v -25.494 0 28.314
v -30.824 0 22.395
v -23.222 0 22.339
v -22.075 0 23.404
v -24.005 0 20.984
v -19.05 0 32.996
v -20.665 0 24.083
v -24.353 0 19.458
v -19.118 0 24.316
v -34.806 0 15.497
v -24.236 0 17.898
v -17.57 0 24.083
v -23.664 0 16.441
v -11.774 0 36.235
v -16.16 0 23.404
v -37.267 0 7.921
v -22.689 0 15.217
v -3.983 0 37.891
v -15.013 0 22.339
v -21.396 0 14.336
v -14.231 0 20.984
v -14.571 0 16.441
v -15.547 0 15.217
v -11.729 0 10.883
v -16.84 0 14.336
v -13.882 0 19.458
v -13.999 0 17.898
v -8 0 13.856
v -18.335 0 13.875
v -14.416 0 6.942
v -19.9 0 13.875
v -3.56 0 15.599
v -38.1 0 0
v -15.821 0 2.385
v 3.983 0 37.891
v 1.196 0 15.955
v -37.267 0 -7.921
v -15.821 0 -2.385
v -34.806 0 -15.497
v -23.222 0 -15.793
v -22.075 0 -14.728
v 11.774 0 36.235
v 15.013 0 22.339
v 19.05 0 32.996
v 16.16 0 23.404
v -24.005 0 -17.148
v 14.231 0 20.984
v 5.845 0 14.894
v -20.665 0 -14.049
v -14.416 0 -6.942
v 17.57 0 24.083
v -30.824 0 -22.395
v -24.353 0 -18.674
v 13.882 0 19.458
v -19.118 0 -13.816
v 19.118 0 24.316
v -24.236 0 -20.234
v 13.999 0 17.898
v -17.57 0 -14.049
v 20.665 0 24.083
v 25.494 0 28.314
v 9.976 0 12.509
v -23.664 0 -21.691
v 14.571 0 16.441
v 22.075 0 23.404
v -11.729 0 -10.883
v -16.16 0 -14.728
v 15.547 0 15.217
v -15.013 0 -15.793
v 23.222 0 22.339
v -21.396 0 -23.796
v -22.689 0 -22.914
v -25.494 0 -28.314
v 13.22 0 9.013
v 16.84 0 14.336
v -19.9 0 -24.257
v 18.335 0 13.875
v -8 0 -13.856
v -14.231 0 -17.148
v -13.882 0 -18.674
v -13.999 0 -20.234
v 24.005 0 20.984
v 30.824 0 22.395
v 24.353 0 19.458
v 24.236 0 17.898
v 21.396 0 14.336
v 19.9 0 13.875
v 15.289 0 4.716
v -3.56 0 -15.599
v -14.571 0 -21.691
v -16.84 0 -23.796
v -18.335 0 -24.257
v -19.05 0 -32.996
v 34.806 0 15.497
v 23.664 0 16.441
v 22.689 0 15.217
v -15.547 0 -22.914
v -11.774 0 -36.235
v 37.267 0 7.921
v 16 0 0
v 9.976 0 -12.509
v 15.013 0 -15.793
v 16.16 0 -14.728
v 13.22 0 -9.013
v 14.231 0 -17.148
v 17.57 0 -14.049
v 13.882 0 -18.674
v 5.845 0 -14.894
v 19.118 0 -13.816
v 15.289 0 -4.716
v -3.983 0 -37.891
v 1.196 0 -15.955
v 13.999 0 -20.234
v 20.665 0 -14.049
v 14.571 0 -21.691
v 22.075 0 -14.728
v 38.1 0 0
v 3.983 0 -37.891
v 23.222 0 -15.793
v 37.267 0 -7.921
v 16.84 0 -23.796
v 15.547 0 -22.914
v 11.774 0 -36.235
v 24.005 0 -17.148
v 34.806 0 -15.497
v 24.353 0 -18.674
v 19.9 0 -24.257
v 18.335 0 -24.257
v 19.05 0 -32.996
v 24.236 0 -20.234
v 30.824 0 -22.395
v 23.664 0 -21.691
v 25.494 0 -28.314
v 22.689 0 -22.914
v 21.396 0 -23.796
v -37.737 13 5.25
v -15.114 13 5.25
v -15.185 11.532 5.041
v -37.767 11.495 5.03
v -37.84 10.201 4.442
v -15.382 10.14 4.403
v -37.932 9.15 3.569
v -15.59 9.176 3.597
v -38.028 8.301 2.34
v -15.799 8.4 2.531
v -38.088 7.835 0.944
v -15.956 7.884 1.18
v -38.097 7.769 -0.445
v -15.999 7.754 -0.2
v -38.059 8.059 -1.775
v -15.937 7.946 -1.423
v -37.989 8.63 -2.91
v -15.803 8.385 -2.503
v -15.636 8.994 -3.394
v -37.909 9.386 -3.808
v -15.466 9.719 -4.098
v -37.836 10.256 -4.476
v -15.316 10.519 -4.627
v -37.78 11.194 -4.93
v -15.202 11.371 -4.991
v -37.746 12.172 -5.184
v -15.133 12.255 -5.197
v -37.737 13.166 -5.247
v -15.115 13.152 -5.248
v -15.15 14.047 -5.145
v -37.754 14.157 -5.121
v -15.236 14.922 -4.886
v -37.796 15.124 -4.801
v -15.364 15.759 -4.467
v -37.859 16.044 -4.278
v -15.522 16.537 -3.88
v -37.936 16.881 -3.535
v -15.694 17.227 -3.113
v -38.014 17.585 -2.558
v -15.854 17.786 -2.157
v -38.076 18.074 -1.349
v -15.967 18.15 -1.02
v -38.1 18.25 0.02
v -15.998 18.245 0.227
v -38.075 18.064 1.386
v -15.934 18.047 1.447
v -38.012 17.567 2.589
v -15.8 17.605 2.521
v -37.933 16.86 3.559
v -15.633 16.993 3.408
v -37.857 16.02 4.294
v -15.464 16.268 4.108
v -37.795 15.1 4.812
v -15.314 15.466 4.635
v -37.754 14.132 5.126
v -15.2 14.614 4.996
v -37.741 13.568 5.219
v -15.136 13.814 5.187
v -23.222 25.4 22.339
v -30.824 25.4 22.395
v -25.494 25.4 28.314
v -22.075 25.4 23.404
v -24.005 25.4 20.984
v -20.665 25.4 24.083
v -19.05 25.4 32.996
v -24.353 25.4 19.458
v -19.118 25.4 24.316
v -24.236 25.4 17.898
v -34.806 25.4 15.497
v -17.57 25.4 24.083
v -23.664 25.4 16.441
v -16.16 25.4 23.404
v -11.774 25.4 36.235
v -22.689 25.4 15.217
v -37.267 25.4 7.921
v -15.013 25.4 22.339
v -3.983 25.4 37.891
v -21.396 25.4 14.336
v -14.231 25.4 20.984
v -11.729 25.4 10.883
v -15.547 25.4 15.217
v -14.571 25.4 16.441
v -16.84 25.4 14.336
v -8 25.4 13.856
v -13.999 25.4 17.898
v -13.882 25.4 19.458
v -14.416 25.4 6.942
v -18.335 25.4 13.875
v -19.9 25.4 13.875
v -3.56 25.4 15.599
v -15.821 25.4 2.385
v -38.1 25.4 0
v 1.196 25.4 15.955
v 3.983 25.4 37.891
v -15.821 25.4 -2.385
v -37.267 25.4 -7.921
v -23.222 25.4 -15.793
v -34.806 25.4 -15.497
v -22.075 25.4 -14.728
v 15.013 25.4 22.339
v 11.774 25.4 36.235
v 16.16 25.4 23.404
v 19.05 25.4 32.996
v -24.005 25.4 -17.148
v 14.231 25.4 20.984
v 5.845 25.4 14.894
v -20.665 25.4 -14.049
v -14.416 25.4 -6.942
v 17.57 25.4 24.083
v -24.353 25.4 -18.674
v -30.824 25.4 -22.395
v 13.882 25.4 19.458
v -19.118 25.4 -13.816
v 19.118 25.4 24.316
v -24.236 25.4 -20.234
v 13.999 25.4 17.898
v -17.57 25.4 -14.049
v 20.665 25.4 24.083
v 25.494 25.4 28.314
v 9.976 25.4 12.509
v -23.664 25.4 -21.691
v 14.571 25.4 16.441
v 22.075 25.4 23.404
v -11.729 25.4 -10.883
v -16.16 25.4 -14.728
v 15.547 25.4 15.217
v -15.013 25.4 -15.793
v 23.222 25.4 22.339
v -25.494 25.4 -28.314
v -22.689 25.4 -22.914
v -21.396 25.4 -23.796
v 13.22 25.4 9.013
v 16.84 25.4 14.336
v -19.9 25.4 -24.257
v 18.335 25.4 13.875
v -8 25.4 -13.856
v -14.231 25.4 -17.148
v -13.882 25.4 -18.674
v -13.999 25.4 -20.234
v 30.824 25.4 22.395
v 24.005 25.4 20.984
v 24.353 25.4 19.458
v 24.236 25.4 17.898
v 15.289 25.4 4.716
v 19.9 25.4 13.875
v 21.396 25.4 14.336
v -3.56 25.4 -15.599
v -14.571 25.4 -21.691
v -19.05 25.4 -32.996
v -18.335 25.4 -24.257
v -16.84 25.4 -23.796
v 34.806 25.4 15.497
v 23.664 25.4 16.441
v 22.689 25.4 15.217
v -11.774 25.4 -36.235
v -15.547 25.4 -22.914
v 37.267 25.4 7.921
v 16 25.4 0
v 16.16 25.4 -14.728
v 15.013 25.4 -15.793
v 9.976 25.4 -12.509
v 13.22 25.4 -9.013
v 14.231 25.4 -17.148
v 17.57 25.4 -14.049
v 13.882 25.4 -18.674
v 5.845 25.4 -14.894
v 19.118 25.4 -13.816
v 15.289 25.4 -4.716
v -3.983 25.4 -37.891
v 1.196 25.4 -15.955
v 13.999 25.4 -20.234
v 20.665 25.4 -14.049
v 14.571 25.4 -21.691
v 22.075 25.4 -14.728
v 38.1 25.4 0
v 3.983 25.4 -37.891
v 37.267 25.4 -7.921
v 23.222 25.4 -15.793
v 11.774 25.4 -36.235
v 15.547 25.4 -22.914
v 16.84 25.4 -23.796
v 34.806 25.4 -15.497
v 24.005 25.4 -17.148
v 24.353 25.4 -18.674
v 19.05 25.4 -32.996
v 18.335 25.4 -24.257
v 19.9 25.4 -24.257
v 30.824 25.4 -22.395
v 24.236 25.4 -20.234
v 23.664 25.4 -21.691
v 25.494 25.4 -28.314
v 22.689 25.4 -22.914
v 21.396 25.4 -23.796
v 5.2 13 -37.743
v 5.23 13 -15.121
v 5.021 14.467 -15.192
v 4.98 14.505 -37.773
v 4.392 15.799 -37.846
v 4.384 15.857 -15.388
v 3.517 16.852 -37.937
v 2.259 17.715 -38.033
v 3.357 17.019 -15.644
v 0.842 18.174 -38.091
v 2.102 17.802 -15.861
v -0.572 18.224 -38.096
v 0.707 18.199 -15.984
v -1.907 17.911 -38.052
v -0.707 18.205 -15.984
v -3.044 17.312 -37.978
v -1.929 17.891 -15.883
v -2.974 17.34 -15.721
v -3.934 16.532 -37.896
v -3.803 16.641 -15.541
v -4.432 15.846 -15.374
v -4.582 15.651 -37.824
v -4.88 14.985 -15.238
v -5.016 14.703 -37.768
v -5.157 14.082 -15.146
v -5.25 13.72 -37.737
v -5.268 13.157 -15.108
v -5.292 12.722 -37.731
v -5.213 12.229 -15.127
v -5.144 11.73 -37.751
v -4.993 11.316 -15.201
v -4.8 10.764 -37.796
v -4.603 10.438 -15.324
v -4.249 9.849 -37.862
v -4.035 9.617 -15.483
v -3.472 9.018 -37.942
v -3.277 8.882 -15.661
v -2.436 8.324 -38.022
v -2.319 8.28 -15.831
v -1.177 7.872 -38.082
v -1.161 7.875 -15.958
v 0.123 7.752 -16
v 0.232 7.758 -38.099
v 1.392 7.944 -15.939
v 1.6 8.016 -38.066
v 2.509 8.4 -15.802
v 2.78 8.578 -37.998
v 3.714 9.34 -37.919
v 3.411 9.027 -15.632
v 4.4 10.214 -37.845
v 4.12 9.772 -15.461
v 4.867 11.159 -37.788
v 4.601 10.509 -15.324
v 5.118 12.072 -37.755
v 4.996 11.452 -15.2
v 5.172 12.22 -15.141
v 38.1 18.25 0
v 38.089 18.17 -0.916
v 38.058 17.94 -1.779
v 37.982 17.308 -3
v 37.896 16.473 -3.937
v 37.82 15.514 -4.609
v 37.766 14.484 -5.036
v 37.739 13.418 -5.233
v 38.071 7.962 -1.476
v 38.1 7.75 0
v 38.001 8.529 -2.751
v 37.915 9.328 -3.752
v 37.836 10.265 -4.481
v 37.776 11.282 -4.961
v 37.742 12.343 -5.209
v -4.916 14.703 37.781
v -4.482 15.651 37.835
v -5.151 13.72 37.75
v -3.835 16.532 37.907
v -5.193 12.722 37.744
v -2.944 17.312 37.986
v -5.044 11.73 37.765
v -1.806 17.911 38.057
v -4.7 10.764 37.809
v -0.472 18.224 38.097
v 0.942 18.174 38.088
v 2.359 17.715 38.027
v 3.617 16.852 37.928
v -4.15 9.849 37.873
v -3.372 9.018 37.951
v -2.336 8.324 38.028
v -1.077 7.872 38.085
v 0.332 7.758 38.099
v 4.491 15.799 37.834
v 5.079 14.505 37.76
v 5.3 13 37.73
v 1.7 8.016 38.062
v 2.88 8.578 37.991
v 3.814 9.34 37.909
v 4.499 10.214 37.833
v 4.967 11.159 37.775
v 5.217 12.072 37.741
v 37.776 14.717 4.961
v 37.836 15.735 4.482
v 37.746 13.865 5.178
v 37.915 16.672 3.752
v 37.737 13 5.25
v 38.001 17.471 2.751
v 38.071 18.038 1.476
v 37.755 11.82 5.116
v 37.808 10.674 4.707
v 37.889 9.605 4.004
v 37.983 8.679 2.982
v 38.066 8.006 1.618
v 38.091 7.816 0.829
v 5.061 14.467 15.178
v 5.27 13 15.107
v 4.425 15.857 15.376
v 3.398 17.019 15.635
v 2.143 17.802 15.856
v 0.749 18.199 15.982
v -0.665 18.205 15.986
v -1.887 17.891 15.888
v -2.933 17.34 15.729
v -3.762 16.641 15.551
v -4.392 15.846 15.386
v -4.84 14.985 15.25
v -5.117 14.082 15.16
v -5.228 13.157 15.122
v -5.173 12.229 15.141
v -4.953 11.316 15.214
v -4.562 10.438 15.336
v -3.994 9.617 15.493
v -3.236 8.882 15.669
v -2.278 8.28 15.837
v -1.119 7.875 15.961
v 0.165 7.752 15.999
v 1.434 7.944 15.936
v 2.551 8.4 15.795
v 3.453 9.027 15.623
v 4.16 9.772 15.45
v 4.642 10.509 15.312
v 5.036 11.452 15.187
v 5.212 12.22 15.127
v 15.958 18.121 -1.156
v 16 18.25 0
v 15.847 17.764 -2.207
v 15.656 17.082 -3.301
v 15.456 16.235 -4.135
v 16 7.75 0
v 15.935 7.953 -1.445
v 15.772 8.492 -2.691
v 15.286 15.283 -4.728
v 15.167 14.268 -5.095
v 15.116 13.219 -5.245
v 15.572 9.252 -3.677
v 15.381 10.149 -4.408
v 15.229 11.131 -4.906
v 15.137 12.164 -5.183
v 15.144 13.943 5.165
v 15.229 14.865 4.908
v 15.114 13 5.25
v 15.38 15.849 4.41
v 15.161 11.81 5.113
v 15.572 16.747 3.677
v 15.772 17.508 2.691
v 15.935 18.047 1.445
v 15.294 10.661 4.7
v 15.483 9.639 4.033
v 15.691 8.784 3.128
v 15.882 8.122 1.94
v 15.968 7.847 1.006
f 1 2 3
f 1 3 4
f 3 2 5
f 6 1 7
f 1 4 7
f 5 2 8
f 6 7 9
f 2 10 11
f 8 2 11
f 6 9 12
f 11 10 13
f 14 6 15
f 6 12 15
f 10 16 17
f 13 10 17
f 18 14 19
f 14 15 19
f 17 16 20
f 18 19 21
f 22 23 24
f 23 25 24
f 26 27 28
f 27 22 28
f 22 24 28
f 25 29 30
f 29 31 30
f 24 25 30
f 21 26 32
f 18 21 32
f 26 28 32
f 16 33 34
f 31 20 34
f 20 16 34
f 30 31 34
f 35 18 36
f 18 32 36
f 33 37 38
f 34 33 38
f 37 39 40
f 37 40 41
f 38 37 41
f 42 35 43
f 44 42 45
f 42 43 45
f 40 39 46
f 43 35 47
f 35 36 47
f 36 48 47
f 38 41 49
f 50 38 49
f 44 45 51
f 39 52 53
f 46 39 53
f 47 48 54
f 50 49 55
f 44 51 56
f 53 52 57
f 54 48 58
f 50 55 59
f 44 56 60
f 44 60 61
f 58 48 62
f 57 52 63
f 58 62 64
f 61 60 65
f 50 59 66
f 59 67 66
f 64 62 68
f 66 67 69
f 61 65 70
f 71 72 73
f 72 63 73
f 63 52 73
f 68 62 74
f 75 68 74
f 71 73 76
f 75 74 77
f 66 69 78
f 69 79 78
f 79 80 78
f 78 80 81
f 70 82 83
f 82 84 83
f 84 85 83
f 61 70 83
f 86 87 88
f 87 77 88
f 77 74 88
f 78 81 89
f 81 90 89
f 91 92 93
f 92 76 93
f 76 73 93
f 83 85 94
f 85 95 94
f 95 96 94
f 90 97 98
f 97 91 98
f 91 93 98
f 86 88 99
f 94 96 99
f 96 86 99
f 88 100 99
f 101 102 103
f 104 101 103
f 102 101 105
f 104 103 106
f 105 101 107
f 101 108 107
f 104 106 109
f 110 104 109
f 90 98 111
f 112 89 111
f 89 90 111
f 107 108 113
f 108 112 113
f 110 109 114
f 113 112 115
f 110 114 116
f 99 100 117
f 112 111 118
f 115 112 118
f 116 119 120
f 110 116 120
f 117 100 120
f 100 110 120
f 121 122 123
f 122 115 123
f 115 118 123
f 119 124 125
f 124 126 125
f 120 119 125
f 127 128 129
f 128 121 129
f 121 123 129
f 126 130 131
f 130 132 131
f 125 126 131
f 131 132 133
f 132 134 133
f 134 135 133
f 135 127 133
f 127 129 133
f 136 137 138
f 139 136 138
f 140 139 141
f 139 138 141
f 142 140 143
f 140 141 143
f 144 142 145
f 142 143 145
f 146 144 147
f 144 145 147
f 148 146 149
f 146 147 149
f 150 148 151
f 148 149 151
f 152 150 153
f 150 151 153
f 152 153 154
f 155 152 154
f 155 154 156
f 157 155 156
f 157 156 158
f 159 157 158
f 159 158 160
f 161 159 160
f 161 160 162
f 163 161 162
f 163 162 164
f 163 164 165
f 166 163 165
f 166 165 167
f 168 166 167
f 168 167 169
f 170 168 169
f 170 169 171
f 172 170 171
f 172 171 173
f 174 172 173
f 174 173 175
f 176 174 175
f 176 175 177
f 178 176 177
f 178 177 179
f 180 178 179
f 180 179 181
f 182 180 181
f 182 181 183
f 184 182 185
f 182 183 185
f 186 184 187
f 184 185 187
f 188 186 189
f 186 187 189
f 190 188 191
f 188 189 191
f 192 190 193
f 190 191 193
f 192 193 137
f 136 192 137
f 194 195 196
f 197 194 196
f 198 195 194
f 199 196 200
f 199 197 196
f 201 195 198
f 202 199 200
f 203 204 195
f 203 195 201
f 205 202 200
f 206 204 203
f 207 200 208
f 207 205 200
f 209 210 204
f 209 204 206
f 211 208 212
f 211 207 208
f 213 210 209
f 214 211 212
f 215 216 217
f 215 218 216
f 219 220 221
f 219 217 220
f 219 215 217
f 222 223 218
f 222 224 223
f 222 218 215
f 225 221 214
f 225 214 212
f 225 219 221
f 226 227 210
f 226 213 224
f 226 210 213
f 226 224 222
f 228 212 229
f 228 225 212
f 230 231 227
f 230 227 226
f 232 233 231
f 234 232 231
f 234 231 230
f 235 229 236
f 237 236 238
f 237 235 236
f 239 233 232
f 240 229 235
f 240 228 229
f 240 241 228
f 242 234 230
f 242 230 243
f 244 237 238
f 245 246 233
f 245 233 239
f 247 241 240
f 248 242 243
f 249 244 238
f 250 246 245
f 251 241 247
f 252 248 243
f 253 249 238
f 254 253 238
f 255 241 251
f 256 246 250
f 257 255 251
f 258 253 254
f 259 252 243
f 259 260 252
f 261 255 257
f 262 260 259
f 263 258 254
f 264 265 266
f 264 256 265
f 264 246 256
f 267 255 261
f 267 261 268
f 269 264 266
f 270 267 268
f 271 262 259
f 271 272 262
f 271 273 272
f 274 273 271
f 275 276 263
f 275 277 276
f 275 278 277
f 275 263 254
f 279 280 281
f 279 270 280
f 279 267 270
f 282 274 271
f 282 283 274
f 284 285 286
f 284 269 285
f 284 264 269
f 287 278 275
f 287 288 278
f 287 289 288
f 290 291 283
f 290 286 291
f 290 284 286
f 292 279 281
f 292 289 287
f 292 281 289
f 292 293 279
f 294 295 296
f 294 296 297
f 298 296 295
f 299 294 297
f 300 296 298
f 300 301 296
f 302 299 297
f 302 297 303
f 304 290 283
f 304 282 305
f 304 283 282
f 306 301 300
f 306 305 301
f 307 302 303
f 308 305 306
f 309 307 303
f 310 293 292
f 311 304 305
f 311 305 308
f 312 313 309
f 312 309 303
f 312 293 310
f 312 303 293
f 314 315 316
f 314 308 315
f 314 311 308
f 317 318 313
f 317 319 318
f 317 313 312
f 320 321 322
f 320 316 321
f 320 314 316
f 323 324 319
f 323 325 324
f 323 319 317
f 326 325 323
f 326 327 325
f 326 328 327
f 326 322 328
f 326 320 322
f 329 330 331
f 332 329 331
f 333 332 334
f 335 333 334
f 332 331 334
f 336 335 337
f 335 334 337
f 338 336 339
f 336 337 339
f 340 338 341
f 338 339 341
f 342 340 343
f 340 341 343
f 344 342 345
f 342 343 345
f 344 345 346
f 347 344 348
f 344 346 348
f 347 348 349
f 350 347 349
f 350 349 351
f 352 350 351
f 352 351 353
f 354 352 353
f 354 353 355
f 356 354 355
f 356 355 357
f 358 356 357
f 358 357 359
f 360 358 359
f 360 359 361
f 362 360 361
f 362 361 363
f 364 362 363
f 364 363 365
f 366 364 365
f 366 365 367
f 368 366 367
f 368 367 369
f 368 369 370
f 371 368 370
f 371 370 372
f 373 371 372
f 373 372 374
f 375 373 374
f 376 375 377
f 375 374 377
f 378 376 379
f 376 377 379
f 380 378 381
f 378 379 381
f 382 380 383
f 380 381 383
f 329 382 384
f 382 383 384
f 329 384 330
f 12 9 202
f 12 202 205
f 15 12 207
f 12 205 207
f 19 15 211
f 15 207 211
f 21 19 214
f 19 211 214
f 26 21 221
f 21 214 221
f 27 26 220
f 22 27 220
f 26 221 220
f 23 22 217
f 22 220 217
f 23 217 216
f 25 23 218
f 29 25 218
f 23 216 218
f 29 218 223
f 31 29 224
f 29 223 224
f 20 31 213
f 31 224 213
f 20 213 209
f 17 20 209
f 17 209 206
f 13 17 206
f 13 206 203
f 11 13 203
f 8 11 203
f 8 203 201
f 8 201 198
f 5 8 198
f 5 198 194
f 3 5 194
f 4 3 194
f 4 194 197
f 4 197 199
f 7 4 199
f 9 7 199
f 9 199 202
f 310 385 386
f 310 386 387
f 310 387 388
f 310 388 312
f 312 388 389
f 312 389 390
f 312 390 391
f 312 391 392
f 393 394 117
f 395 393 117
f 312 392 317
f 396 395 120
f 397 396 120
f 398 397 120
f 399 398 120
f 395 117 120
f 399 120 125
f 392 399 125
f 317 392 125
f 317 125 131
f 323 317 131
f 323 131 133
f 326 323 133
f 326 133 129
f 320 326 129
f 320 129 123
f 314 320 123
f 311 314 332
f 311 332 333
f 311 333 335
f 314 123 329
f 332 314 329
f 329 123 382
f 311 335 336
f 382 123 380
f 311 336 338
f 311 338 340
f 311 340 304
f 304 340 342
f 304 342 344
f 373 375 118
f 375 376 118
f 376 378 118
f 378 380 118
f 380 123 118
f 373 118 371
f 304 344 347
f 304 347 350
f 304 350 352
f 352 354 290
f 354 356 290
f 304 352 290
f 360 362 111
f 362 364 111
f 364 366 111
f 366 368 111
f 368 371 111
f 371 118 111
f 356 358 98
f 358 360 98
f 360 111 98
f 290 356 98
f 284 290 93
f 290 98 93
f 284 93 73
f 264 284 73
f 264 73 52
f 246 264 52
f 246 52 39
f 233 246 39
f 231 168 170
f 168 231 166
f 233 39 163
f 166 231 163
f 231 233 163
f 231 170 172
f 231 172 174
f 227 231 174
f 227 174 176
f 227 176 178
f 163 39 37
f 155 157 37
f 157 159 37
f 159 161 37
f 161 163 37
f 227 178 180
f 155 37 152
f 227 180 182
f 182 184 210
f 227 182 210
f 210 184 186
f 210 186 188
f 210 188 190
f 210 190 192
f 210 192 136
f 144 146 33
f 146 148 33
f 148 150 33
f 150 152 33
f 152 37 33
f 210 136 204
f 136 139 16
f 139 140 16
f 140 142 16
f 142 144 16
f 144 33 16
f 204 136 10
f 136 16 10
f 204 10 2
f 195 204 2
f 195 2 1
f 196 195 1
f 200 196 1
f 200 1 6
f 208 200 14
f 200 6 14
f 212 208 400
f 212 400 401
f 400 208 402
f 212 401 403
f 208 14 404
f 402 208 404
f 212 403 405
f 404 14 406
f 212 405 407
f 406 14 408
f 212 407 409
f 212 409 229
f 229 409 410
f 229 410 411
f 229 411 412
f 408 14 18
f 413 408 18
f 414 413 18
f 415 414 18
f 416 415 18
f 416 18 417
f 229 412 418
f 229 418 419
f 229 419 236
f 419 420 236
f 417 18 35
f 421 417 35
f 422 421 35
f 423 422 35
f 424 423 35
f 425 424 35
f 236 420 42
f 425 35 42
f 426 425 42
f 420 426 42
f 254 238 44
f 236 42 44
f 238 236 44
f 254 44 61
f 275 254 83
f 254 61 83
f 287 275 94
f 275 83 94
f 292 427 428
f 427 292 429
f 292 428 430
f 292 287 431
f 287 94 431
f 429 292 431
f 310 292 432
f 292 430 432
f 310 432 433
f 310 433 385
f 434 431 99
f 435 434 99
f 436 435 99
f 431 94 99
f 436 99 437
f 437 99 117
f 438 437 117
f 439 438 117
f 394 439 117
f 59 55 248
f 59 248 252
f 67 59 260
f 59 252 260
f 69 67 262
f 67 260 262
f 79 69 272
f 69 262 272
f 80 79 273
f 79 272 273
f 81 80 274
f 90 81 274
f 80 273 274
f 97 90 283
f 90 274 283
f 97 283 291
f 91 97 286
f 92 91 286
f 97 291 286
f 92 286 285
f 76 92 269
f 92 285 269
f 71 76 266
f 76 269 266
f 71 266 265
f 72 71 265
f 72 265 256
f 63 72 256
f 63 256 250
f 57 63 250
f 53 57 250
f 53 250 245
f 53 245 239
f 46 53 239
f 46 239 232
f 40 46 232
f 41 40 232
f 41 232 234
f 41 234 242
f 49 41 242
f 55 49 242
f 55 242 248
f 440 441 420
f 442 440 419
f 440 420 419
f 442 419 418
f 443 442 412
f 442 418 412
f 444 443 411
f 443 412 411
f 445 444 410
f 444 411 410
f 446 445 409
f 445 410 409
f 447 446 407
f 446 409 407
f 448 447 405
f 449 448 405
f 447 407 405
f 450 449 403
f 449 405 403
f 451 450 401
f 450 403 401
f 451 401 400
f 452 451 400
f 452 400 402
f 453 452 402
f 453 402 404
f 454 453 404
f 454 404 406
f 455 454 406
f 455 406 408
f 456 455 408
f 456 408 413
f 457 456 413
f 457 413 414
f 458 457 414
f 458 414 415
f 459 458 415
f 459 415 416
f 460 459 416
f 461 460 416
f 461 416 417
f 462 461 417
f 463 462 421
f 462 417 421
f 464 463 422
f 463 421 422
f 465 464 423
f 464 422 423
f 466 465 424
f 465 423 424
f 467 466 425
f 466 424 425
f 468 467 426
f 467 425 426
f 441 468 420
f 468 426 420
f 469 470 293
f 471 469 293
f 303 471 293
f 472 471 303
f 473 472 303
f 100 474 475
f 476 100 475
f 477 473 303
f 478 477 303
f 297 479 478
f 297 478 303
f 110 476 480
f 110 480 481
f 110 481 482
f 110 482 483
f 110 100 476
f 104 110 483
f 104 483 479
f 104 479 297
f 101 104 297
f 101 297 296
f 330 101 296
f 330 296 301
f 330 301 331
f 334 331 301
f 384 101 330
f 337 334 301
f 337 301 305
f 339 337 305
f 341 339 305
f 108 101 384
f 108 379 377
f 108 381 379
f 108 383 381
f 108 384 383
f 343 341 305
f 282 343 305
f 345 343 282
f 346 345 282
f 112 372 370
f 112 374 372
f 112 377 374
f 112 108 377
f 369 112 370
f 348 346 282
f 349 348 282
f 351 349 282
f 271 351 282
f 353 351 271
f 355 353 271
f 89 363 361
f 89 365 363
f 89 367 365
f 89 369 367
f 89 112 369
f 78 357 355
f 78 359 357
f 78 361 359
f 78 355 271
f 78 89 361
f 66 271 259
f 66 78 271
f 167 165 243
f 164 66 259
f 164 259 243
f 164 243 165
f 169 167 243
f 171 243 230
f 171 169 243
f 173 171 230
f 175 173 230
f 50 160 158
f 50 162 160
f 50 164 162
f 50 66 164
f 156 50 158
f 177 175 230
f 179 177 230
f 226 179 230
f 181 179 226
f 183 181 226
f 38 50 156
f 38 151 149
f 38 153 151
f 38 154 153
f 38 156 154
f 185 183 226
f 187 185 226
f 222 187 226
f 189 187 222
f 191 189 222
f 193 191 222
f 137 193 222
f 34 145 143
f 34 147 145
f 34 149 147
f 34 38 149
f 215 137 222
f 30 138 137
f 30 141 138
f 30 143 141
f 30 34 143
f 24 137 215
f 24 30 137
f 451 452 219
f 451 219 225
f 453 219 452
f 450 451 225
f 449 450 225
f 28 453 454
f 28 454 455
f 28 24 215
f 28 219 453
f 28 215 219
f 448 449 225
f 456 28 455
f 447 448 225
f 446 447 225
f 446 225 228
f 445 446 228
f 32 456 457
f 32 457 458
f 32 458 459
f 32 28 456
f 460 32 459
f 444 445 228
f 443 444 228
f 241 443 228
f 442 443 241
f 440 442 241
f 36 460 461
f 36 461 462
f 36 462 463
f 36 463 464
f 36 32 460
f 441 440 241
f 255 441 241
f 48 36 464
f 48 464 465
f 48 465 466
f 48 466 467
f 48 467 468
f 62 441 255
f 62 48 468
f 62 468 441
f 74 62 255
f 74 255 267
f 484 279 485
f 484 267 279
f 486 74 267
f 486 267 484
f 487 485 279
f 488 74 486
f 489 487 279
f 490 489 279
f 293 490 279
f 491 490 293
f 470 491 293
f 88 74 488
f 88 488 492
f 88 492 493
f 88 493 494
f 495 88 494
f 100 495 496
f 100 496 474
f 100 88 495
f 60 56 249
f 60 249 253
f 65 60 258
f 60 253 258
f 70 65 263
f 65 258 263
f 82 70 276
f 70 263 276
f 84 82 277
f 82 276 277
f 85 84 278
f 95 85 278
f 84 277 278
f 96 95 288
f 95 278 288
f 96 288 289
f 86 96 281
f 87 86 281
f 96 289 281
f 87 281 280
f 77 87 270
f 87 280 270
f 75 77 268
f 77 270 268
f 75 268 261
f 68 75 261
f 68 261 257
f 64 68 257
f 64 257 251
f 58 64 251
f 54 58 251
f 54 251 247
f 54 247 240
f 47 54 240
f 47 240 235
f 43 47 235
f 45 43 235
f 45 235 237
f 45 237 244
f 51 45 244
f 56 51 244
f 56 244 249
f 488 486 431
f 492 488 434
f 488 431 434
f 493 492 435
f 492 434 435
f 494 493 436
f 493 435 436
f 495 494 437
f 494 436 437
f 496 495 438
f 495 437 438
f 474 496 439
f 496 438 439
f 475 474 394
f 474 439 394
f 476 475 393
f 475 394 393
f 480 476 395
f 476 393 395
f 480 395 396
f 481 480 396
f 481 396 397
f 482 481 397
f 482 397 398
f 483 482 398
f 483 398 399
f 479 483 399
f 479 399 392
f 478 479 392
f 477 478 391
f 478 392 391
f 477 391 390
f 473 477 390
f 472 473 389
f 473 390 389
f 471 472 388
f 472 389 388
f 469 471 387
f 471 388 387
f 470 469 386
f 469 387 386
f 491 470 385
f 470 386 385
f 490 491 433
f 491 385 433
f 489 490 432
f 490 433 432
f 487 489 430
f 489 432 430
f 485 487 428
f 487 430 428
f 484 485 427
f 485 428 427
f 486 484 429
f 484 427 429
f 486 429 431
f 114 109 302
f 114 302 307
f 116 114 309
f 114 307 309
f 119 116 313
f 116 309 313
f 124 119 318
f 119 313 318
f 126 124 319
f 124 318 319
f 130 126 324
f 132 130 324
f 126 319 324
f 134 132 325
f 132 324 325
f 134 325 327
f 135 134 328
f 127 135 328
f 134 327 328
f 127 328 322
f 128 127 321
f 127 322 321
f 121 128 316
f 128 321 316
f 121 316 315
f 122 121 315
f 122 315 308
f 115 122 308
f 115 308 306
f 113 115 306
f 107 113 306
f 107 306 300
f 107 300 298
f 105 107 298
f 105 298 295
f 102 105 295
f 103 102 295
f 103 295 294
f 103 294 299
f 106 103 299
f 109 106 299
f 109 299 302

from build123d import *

# Parameters (mm, degrees)
SKETCH1_R                                  = 38.1
SKETCH1_R_2                                = 16
BOSS_EXTRUDE1_DEPTH                        = 25.4
F_10_5_10_5_DIAMETER_HOLE1_D               = 10.5
F_10_5_10_5_DIAMETER_HOLE1_DEPTH           = 300
F_10_5_10_5_DIAMETER_HOLE1_TIP             = 3.15451825
F_10_5_10_5_DIAMETER_HOLE1_ON_FACE_2_D     = 10.5
F_10_5_10_5_DIAMETER_HOLE1_ON_FACE_2_DEPTH = 300
F_10_5_10_5_DIAMETER_HOLE1_ON_FACE_2_TIP   = 3.15451825
F_10_5_10_5_DIAMETER_HOLE1_ON_FACE_3_D     = 10.5
F_10_5_10_5_DIAMETER_HOLE1_ON_FACE_3_DEPTH = 300
F_10_5_10_5_DIAMETER_HOLE1_ON_FACE_3_TIP   = 3.15451825


with BuildPart() as part:
    # Sketch1 → Boss-Extrude1 (new body)
    with BuildSketch(Plane(origin=(0, 0, 0), x_dir=(1, 0, 0), z_dir=(0, 1, 0))):
        Circle(SKETCH1_R)
        Circle(SKETCH1_R_2, mode=Mode.SUBTRACT)
    extrude(amount=BOSS_EXTRUDE1_DEPTH)

    # Ø10.5 (10.5) Diameter Hole1
    with Locations(Plane(origin=(-0.05014739, 13, -38.099966998), x_dir=(-0.999999134, 0, 0.001316204), z_dir=(-0.001316204, 0, -0.999999134))):
        with Locations((0, 0)):
            Hole(F_10_5_10_5_DIAMETER_HOLE1_D / 2, depth=F_10_5_10_5_DIAMETER_HOLE1_DEPTH)
            with Locations((0, 0, -(F_10_5_10_5_DIAMETER_HOLE1_DEPTH + F_10_5_10_5_DIAMETER_HOLE1_TIP / 2))):  # 118° drill point
                Cone(0, F_10_5_10_5_DIAMETER_HOLE1_D / 2, F_10_5_10_5_DIAMETER_HOLE1_TIP, mode=Mode.SUBTRACT)

    # Ø10.5 (10.5) Diameter Hole1 on face 2
    with Locations(Plane(origin=(-38.1, 13, 0), x_dir=(0, 0, -1), z_dir=(-1, 0, 0))):
        with Locations((0, 0)):
            Hole(F_10_5_10_5_DIAMETER_HOLE1_ON_FACE_2_D / 2, depth=F_10_5_10_5_DIAMETER_HOLE1_ON_FACE_2_DEPTH)
            with Locations((0, 0, -(F_10_5_10_5_DIAMETER_HOLE1_ON_FACE_2_DEPTH + F_10_5_10_5_DIAMETER_HOLE1_ON_FACE_2_TIP / 2))):  # 118° drill point
                Cone(0, F_10_5_10_5_DIAMETER_HOLE1_ON_FACE_2_D / 2, F_10_5_10_5_DIAMETER_HOLE1_ON_FACE_2_TIP, mode=Mode.SUBTRACT)

    # Ø10.5 (10.5) Diameter Hole1 on face 3
    with Locations(Plane(origin=(19.117815044, 0, -19.06591587), x_dir=(0, 0, -1), z_dir=(0, -1, 0))):
        with Locations((0, 0), (0, -38.235630088), (-38.13183174, -38.235630088), (-38.13183174, 0)):
            Hole(F_10_5_10_5_DIAMETER_HOLE1_ON_FACE_3_D / 2, depth=F_10_5_10_5_DIAMETER_HOLE1_ON_FACE_3_DEPTH)
            with Locations((0, 0, -(F_10_5_10_5_DIAMETER_HOLE1_ON_FACE_3_DEPTH + F_10_5_10_5_DIAMETER_HOLE1_ON_FACE_3_TIP / 2))):  # 118° drill point
                Cone(0, F_10_5_10_5_DIAMETER_HOLE1_ON_FACE_3_D / 2, F_10_5_10_5_DIAMETER_HOLE1_ON_FACE_3_TIP, mode=Mode.SUBTRACT)


solid = part.part
